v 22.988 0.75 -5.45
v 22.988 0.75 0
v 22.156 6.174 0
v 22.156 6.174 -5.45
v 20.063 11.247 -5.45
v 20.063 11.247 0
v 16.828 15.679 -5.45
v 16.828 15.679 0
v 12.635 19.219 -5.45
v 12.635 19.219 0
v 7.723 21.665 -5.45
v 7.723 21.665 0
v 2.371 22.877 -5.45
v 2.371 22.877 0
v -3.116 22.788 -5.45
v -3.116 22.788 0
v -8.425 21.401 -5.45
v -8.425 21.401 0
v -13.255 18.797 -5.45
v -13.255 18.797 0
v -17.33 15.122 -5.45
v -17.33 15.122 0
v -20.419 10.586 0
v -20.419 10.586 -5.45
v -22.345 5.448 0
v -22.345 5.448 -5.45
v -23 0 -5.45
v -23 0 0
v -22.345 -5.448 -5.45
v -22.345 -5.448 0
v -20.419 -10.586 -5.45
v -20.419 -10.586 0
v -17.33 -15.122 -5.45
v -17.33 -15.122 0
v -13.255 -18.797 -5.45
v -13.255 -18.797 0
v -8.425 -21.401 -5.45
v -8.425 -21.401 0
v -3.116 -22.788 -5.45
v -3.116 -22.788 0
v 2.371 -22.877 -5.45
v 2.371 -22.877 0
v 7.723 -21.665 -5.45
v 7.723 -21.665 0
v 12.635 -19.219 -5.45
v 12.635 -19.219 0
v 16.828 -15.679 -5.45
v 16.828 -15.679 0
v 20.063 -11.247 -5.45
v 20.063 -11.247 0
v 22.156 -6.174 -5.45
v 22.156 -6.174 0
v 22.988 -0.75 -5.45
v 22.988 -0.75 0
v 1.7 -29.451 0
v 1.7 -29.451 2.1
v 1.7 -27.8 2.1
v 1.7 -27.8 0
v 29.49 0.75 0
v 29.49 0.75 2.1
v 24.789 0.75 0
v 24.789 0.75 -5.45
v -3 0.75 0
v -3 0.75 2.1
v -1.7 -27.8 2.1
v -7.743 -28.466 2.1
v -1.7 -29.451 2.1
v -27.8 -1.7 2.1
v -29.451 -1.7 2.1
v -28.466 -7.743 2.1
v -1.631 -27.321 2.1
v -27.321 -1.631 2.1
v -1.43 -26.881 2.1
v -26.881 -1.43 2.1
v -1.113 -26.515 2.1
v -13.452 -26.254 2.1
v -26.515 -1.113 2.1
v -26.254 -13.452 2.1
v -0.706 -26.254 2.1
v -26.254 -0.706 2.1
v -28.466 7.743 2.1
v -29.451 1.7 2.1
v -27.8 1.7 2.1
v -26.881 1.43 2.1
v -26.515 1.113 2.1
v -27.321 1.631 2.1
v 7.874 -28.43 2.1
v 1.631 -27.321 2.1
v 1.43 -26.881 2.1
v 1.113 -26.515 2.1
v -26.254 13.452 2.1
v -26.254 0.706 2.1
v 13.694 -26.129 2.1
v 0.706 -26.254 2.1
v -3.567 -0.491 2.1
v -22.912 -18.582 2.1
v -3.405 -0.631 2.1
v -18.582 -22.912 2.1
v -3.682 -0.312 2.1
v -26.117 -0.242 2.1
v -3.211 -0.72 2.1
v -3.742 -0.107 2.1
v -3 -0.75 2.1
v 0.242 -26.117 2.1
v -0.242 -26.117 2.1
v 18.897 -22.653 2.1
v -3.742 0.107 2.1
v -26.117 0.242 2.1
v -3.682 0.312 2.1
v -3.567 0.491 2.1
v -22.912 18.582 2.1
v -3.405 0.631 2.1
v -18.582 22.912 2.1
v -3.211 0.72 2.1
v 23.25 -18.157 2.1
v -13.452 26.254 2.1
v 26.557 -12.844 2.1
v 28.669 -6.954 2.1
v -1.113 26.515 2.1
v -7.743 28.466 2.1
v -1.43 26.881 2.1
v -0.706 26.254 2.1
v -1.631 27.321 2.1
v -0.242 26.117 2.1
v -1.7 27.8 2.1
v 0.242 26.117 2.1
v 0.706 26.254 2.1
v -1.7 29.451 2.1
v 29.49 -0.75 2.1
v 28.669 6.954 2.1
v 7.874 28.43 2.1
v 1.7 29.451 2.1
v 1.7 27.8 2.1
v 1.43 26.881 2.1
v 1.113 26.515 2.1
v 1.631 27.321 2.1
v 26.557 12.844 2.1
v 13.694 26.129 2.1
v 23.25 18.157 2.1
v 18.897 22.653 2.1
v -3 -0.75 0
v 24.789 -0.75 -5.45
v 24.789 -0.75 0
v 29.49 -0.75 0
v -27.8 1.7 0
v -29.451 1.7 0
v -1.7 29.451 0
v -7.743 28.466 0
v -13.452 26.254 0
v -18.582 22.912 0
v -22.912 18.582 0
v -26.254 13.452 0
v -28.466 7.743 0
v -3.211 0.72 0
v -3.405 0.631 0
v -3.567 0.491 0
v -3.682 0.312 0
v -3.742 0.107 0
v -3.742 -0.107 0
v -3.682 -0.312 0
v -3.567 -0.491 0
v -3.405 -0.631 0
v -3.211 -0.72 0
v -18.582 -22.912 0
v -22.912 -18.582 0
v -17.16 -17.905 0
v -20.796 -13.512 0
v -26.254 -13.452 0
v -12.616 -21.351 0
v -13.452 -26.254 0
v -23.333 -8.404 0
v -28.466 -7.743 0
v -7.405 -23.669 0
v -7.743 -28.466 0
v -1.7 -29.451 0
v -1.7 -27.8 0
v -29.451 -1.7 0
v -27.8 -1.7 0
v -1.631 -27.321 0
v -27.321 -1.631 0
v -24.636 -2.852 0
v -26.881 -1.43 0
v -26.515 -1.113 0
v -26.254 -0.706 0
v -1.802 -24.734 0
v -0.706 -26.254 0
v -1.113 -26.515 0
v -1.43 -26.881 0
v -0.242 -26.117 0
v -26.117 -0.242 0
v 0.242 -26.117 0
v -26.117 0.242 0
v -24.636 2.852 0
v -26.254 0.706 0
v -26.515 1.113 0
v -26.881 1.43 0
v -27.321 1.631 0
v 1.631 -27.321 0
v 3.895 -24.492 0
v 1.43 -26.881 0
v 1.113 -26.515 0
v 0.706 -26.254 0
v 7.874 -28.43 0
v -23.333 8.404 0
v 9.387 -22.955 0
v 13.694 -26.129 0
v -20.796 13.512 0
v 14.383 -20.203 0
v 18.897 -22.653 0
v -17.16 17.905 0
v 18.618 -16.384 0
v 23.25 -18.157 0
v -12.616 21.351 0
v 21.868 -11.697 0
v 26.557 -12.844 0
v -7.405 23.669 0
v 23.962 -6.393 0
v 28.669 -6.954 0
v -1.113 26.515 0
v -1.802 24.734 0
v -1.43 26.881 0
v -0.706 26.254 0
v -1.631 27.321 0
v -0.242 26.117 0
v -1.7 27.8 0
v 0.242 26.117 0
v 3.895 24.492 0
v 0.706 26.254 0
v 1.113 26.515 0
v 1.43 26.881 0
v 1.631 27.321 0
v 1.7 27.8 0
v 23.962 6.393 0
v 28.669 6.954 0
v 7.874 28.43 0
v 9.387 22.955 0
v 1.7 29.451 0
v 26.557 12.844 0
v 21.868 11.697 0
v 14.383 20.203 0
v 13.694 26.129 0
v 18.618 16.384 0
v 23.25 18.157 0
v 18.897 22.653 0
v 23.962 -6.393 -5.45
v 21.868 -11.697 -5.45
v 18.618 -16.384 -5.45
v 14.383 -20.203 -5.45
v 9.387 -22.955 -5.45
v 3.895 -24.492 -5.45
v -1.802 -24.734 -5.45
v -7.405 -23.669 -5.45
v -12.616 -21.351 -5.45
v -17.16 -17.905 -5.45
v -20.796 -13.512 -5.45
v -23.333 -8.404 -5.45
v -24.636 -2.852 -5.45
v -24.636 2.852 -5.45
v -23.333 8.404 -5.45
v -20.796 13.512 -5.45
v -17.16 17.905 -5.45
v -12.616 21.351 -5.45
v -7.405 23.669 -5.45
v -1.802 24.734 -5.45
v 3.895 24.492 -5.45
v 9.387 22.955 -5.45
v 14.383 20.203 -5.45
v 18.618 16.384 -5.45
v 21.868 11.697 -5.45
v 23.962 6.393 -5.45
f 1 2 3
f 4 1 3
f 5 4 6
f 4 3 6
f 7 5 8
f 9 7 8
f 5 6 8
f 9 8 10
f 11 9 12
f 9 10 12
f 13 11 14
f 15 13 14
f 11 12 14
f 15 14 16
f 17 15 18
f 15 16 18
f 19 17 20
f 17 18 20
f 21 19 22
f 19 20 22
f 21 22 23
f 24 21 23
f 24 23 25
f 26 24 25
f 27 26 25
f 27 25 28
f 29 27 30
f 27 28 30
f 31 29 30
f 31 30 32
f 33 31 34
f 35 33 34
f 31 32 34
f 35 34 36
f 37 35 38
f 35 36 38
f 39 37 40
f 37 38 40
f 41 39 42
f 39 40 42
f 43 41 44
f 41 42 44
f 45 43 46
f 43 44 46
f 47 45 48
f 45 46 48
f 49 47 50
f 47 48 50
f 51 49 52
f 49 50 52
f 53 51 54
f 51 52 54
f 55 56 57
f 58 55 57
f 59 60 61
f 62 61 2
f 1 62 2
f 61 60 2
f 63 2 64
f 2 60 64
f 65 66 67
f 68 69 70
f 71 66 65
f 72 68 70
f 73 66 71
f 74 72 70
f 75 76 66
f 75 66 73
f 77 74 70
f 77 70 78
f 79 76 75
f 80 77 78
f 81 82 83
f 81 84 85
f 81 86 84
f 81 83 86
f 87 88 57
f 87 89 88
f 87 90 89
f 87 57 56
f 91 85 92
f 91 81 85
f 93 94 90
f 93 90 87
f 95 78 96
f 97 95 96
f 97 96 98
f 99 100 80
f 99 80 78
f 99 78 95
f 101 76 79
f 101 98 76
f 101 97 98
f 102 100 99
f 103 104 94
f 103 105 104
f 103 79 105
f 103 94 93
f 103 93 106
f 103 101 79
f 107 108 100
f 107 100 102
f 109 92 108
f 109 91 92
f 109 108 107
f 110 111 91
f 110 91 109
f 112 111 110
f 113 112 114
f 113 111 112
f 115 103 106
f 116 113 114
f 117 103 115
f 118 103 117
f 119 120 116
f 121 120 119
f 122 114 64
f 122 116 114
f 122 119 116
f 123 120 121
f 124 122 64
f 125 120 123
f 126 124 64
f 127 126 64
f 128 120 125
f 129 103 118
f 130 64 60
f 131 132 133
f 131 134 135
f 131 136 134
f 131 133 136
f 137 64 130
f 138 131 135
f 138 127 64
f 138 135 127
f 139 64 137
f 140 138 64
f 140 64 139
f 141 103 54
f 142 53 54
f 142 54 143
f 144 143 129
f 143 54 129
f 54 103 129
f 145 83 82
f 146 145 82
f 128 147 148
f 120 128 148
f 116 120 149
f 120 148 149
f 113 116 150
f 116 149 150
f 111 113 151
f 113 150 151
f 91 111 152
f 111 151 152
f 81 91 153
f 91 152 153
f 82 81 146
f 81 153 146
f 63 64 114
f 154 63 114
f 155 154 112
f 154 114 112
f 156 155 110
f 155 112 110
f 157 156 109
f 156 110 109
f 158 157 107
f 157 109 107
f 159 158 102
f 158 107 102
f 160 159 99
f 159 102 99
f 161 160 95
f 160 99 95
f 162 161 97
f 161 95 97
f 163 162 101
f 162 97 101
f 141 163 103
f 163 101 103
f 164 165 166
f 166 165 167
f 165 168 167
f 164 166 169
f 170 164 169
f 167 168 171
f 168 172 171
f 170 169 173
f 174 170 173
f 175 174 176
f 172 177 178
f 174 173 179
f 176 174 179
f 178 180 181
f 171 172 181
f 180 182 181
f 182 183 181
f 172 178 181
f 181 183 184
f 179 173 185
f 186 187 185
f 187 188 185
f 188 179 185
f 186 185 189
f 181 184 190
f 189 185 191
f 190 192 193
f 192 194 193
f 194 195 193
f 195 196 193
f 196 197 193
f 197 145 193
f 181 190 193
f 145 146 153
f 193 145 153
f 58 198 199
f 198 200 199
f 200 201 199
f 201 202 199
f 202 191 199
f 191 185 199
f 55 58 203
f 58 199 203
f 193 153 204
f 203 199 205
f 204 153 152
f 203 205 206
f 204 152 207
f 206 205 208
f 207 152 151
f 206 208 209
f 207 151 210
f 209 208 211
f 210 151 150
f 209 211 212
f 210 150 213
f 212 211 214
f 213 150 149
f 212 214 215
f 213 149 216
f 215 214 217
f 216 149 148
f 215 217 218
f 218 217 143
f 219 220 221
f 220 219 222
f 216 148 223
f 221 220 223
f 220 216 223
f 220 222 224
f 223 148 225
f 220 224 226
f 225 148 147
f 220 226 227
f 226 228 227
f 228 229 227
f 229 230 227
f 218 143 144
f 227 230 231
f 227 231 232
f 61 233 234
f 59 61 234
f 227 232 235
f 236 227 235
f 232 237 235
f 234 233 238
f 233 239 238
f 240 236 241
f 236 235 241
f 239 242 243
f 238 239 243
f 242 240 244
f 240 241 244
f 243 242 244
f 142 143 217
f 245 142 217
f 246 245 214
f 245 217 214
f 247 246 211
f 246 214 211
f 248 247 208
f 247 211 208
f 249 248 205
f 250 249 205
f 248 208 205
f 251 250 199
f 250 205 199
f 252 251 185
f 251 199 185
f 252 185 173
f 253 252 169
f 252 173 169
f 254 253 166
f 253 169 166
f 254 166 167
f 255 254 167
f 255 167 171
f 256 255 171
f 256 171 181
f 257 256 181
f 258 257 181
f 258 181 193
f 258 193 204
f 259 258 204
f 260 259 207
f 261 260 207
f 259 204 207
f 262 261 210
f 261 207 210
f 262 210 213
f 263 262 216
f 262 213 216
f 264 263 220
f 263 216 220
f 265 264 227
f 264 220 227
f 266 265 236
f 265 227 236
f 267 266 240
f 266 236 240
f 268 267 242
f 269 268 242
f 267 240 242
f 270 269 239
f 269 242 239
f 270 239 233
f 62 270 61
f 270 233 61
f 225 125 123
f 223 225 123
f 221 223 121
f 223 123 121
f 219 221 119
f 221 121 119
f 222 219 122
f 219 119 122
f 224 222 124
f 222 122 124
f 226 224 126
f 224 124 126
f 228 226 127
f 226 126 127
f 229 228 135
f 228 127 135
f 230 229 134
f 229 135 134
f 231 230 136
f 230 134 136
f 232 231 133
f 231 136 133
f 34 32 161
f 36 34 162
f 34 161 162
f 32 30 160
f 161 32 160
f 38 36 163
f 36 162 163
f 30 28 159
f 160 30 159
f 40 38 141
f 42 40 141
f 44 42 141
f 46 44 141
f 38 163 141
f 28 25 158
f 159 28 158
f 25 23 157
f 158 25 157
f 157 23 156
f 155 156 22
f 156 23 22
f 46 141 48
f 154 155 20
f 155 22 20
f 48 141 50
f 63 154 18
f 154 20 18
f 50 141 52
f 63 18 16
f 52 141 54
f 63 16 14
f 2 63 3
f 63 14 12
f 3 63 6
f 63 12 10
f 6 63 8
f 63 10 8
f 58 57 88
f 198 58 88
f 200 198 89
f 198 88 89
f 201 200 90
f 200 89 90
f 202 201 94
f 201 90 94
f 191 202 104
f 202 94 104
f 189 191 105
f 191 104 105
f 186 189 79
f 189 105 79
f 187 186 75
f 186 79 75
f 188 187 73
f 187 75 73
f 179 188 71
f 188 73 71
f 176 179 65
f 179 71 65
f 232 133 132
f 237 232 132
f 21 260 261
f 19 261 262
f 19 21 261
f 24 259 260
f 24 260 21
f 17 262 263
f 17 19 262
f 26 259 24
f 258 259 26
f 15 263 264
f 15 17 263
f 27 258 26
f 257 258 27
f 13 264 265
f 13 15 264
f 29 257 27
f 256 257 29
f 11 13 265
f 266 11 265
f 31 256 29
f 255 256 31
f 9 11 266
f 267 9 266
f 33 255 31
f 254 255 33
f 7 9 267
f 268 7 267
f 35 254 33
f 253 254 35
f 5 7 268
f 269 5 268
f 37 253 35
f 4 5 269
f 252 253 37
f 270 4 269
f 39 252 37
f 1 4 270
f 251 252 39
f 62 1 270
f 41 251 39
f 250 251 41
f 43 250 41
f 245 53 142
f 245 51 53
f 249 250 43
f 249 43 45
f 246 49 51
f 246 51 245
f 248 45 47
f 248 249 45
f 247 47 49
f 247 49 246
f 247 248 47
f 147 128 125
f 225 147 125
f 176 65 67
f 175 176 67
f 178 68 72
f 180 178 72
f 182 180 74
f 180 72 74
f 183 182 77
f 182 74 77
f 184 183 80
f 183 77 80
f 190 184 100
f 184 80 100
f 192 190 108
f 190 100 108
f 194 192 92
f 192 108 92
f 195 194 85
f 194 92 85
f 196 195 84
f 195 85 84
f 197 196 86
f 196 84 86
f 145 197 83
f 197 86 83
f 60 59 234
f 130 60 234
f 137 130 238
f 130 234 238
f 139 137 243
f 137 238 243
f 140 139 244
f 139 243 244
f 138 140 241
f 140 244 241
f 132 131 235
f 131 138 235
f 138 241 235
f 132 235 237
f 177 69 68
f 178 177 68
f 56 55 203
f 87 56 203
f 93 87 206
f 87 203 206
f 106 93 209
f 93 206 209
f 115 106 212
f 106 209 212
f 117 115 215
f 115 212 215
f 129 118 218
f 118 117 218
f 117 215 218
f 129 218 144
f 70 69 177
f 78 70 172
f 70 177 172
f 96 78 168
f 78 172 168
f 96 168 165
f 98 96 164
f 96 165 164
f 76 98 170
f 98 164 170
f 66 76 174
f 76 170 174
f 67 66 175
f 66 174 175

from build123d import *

# Parameters (mm, degrees)
F0_R            = 29.5
F2_DEPTH        = 2.1
F4_DEPTH        = 2.1
F4_COPIES_COUNT = 3
F4_COPIES_ANGLE = 180
F6_DEPTH        = 2.1
F8_DEPTH        = 5.45


# Not quite as in the source:
# - a pattern or mirror of a feature is missing from the dataset's text; its kind, count and spacing are read off the source's solid


with BuildPart() as f2:
    # F0 (on Top) → F2 (new body)
    with BuildSketch(Plane.XY):
        Circle(F0_R)
    extrude(amount=F2_DEPTH)

    # F3 (on face) → F4 (cut, through all)
    with BuildSketch(Plane.XY.offset(2.1)):
        with BuildLine():
            ThreePointArc((-1.7, 27.8), (0, 26.1), (1.7, 27.8))
            Line((1.7, 27.8), (1.7, 29.4509762147))
            ThreePointArc((1.7, 29.4509762147), (0, 29.5), (-1.7, 29.4509762147))
            Line((-1.7, 29.4509762147), (-1.7, 27.8))
        make_face()
    f4 = extrude(amount=-F4_DEPTH, mode=Mode.SUBTRACT)

    # F4_copies: F4 ×3 about axis
    f4_copies_axis = Axis((0, 0, 0), (0, 0, 1))
    for i in range(1, F4_COPIES_COUNT):
        add(f4.rotate(f4_copies_axis, i * F4_COPIES_ANGLE / (F4_COPIES_COUNT - 1)), mode=Mode.SUBTRACT)

    # F5 (on face) → F6 (cut, through all)
    with BuildSketch(Plane.XY.offset(2.1)):
        with BuildLine():
            ThreePointArc((-3, 0.75), (-3.75, 0), (-3, -0.75))
            Line((-3, -0.75), (29.4904645606, -0.75))
            ThreePointArc((29.4904645606, -0.75), (29.5, 0), (29.4904645606, 0.75))
            Line((29.4904645606, 0.75), (-3, 0.75))
        make_face()
    extrude(amount=-F6_DEPTH, mode=Mode.SUBTRACT)

    # F7 (on face) → F8 (join)
    with BuildSketch(Plane(origin=(0, 0, 0), x_dir=(1, 0, 0), z_dir=(0, 0, -1))):
        with BuildLine():
            Line((22.9877684867, 0.75), (24.78865668, 0.75))
            ThreePointArc((24.78865668, 0.75), (-24.8, 0), (24.78865668, -0.75))
            Line((24.78865668, -0.75), (22.9877684867, -0.75))
            ThreePointArc((22.9877684867, -0.75), (-23, 0), (22.9877684867, 0.75))
        make_face()
    extrude(amount=F8_DEPTH)


solid = f2.part
